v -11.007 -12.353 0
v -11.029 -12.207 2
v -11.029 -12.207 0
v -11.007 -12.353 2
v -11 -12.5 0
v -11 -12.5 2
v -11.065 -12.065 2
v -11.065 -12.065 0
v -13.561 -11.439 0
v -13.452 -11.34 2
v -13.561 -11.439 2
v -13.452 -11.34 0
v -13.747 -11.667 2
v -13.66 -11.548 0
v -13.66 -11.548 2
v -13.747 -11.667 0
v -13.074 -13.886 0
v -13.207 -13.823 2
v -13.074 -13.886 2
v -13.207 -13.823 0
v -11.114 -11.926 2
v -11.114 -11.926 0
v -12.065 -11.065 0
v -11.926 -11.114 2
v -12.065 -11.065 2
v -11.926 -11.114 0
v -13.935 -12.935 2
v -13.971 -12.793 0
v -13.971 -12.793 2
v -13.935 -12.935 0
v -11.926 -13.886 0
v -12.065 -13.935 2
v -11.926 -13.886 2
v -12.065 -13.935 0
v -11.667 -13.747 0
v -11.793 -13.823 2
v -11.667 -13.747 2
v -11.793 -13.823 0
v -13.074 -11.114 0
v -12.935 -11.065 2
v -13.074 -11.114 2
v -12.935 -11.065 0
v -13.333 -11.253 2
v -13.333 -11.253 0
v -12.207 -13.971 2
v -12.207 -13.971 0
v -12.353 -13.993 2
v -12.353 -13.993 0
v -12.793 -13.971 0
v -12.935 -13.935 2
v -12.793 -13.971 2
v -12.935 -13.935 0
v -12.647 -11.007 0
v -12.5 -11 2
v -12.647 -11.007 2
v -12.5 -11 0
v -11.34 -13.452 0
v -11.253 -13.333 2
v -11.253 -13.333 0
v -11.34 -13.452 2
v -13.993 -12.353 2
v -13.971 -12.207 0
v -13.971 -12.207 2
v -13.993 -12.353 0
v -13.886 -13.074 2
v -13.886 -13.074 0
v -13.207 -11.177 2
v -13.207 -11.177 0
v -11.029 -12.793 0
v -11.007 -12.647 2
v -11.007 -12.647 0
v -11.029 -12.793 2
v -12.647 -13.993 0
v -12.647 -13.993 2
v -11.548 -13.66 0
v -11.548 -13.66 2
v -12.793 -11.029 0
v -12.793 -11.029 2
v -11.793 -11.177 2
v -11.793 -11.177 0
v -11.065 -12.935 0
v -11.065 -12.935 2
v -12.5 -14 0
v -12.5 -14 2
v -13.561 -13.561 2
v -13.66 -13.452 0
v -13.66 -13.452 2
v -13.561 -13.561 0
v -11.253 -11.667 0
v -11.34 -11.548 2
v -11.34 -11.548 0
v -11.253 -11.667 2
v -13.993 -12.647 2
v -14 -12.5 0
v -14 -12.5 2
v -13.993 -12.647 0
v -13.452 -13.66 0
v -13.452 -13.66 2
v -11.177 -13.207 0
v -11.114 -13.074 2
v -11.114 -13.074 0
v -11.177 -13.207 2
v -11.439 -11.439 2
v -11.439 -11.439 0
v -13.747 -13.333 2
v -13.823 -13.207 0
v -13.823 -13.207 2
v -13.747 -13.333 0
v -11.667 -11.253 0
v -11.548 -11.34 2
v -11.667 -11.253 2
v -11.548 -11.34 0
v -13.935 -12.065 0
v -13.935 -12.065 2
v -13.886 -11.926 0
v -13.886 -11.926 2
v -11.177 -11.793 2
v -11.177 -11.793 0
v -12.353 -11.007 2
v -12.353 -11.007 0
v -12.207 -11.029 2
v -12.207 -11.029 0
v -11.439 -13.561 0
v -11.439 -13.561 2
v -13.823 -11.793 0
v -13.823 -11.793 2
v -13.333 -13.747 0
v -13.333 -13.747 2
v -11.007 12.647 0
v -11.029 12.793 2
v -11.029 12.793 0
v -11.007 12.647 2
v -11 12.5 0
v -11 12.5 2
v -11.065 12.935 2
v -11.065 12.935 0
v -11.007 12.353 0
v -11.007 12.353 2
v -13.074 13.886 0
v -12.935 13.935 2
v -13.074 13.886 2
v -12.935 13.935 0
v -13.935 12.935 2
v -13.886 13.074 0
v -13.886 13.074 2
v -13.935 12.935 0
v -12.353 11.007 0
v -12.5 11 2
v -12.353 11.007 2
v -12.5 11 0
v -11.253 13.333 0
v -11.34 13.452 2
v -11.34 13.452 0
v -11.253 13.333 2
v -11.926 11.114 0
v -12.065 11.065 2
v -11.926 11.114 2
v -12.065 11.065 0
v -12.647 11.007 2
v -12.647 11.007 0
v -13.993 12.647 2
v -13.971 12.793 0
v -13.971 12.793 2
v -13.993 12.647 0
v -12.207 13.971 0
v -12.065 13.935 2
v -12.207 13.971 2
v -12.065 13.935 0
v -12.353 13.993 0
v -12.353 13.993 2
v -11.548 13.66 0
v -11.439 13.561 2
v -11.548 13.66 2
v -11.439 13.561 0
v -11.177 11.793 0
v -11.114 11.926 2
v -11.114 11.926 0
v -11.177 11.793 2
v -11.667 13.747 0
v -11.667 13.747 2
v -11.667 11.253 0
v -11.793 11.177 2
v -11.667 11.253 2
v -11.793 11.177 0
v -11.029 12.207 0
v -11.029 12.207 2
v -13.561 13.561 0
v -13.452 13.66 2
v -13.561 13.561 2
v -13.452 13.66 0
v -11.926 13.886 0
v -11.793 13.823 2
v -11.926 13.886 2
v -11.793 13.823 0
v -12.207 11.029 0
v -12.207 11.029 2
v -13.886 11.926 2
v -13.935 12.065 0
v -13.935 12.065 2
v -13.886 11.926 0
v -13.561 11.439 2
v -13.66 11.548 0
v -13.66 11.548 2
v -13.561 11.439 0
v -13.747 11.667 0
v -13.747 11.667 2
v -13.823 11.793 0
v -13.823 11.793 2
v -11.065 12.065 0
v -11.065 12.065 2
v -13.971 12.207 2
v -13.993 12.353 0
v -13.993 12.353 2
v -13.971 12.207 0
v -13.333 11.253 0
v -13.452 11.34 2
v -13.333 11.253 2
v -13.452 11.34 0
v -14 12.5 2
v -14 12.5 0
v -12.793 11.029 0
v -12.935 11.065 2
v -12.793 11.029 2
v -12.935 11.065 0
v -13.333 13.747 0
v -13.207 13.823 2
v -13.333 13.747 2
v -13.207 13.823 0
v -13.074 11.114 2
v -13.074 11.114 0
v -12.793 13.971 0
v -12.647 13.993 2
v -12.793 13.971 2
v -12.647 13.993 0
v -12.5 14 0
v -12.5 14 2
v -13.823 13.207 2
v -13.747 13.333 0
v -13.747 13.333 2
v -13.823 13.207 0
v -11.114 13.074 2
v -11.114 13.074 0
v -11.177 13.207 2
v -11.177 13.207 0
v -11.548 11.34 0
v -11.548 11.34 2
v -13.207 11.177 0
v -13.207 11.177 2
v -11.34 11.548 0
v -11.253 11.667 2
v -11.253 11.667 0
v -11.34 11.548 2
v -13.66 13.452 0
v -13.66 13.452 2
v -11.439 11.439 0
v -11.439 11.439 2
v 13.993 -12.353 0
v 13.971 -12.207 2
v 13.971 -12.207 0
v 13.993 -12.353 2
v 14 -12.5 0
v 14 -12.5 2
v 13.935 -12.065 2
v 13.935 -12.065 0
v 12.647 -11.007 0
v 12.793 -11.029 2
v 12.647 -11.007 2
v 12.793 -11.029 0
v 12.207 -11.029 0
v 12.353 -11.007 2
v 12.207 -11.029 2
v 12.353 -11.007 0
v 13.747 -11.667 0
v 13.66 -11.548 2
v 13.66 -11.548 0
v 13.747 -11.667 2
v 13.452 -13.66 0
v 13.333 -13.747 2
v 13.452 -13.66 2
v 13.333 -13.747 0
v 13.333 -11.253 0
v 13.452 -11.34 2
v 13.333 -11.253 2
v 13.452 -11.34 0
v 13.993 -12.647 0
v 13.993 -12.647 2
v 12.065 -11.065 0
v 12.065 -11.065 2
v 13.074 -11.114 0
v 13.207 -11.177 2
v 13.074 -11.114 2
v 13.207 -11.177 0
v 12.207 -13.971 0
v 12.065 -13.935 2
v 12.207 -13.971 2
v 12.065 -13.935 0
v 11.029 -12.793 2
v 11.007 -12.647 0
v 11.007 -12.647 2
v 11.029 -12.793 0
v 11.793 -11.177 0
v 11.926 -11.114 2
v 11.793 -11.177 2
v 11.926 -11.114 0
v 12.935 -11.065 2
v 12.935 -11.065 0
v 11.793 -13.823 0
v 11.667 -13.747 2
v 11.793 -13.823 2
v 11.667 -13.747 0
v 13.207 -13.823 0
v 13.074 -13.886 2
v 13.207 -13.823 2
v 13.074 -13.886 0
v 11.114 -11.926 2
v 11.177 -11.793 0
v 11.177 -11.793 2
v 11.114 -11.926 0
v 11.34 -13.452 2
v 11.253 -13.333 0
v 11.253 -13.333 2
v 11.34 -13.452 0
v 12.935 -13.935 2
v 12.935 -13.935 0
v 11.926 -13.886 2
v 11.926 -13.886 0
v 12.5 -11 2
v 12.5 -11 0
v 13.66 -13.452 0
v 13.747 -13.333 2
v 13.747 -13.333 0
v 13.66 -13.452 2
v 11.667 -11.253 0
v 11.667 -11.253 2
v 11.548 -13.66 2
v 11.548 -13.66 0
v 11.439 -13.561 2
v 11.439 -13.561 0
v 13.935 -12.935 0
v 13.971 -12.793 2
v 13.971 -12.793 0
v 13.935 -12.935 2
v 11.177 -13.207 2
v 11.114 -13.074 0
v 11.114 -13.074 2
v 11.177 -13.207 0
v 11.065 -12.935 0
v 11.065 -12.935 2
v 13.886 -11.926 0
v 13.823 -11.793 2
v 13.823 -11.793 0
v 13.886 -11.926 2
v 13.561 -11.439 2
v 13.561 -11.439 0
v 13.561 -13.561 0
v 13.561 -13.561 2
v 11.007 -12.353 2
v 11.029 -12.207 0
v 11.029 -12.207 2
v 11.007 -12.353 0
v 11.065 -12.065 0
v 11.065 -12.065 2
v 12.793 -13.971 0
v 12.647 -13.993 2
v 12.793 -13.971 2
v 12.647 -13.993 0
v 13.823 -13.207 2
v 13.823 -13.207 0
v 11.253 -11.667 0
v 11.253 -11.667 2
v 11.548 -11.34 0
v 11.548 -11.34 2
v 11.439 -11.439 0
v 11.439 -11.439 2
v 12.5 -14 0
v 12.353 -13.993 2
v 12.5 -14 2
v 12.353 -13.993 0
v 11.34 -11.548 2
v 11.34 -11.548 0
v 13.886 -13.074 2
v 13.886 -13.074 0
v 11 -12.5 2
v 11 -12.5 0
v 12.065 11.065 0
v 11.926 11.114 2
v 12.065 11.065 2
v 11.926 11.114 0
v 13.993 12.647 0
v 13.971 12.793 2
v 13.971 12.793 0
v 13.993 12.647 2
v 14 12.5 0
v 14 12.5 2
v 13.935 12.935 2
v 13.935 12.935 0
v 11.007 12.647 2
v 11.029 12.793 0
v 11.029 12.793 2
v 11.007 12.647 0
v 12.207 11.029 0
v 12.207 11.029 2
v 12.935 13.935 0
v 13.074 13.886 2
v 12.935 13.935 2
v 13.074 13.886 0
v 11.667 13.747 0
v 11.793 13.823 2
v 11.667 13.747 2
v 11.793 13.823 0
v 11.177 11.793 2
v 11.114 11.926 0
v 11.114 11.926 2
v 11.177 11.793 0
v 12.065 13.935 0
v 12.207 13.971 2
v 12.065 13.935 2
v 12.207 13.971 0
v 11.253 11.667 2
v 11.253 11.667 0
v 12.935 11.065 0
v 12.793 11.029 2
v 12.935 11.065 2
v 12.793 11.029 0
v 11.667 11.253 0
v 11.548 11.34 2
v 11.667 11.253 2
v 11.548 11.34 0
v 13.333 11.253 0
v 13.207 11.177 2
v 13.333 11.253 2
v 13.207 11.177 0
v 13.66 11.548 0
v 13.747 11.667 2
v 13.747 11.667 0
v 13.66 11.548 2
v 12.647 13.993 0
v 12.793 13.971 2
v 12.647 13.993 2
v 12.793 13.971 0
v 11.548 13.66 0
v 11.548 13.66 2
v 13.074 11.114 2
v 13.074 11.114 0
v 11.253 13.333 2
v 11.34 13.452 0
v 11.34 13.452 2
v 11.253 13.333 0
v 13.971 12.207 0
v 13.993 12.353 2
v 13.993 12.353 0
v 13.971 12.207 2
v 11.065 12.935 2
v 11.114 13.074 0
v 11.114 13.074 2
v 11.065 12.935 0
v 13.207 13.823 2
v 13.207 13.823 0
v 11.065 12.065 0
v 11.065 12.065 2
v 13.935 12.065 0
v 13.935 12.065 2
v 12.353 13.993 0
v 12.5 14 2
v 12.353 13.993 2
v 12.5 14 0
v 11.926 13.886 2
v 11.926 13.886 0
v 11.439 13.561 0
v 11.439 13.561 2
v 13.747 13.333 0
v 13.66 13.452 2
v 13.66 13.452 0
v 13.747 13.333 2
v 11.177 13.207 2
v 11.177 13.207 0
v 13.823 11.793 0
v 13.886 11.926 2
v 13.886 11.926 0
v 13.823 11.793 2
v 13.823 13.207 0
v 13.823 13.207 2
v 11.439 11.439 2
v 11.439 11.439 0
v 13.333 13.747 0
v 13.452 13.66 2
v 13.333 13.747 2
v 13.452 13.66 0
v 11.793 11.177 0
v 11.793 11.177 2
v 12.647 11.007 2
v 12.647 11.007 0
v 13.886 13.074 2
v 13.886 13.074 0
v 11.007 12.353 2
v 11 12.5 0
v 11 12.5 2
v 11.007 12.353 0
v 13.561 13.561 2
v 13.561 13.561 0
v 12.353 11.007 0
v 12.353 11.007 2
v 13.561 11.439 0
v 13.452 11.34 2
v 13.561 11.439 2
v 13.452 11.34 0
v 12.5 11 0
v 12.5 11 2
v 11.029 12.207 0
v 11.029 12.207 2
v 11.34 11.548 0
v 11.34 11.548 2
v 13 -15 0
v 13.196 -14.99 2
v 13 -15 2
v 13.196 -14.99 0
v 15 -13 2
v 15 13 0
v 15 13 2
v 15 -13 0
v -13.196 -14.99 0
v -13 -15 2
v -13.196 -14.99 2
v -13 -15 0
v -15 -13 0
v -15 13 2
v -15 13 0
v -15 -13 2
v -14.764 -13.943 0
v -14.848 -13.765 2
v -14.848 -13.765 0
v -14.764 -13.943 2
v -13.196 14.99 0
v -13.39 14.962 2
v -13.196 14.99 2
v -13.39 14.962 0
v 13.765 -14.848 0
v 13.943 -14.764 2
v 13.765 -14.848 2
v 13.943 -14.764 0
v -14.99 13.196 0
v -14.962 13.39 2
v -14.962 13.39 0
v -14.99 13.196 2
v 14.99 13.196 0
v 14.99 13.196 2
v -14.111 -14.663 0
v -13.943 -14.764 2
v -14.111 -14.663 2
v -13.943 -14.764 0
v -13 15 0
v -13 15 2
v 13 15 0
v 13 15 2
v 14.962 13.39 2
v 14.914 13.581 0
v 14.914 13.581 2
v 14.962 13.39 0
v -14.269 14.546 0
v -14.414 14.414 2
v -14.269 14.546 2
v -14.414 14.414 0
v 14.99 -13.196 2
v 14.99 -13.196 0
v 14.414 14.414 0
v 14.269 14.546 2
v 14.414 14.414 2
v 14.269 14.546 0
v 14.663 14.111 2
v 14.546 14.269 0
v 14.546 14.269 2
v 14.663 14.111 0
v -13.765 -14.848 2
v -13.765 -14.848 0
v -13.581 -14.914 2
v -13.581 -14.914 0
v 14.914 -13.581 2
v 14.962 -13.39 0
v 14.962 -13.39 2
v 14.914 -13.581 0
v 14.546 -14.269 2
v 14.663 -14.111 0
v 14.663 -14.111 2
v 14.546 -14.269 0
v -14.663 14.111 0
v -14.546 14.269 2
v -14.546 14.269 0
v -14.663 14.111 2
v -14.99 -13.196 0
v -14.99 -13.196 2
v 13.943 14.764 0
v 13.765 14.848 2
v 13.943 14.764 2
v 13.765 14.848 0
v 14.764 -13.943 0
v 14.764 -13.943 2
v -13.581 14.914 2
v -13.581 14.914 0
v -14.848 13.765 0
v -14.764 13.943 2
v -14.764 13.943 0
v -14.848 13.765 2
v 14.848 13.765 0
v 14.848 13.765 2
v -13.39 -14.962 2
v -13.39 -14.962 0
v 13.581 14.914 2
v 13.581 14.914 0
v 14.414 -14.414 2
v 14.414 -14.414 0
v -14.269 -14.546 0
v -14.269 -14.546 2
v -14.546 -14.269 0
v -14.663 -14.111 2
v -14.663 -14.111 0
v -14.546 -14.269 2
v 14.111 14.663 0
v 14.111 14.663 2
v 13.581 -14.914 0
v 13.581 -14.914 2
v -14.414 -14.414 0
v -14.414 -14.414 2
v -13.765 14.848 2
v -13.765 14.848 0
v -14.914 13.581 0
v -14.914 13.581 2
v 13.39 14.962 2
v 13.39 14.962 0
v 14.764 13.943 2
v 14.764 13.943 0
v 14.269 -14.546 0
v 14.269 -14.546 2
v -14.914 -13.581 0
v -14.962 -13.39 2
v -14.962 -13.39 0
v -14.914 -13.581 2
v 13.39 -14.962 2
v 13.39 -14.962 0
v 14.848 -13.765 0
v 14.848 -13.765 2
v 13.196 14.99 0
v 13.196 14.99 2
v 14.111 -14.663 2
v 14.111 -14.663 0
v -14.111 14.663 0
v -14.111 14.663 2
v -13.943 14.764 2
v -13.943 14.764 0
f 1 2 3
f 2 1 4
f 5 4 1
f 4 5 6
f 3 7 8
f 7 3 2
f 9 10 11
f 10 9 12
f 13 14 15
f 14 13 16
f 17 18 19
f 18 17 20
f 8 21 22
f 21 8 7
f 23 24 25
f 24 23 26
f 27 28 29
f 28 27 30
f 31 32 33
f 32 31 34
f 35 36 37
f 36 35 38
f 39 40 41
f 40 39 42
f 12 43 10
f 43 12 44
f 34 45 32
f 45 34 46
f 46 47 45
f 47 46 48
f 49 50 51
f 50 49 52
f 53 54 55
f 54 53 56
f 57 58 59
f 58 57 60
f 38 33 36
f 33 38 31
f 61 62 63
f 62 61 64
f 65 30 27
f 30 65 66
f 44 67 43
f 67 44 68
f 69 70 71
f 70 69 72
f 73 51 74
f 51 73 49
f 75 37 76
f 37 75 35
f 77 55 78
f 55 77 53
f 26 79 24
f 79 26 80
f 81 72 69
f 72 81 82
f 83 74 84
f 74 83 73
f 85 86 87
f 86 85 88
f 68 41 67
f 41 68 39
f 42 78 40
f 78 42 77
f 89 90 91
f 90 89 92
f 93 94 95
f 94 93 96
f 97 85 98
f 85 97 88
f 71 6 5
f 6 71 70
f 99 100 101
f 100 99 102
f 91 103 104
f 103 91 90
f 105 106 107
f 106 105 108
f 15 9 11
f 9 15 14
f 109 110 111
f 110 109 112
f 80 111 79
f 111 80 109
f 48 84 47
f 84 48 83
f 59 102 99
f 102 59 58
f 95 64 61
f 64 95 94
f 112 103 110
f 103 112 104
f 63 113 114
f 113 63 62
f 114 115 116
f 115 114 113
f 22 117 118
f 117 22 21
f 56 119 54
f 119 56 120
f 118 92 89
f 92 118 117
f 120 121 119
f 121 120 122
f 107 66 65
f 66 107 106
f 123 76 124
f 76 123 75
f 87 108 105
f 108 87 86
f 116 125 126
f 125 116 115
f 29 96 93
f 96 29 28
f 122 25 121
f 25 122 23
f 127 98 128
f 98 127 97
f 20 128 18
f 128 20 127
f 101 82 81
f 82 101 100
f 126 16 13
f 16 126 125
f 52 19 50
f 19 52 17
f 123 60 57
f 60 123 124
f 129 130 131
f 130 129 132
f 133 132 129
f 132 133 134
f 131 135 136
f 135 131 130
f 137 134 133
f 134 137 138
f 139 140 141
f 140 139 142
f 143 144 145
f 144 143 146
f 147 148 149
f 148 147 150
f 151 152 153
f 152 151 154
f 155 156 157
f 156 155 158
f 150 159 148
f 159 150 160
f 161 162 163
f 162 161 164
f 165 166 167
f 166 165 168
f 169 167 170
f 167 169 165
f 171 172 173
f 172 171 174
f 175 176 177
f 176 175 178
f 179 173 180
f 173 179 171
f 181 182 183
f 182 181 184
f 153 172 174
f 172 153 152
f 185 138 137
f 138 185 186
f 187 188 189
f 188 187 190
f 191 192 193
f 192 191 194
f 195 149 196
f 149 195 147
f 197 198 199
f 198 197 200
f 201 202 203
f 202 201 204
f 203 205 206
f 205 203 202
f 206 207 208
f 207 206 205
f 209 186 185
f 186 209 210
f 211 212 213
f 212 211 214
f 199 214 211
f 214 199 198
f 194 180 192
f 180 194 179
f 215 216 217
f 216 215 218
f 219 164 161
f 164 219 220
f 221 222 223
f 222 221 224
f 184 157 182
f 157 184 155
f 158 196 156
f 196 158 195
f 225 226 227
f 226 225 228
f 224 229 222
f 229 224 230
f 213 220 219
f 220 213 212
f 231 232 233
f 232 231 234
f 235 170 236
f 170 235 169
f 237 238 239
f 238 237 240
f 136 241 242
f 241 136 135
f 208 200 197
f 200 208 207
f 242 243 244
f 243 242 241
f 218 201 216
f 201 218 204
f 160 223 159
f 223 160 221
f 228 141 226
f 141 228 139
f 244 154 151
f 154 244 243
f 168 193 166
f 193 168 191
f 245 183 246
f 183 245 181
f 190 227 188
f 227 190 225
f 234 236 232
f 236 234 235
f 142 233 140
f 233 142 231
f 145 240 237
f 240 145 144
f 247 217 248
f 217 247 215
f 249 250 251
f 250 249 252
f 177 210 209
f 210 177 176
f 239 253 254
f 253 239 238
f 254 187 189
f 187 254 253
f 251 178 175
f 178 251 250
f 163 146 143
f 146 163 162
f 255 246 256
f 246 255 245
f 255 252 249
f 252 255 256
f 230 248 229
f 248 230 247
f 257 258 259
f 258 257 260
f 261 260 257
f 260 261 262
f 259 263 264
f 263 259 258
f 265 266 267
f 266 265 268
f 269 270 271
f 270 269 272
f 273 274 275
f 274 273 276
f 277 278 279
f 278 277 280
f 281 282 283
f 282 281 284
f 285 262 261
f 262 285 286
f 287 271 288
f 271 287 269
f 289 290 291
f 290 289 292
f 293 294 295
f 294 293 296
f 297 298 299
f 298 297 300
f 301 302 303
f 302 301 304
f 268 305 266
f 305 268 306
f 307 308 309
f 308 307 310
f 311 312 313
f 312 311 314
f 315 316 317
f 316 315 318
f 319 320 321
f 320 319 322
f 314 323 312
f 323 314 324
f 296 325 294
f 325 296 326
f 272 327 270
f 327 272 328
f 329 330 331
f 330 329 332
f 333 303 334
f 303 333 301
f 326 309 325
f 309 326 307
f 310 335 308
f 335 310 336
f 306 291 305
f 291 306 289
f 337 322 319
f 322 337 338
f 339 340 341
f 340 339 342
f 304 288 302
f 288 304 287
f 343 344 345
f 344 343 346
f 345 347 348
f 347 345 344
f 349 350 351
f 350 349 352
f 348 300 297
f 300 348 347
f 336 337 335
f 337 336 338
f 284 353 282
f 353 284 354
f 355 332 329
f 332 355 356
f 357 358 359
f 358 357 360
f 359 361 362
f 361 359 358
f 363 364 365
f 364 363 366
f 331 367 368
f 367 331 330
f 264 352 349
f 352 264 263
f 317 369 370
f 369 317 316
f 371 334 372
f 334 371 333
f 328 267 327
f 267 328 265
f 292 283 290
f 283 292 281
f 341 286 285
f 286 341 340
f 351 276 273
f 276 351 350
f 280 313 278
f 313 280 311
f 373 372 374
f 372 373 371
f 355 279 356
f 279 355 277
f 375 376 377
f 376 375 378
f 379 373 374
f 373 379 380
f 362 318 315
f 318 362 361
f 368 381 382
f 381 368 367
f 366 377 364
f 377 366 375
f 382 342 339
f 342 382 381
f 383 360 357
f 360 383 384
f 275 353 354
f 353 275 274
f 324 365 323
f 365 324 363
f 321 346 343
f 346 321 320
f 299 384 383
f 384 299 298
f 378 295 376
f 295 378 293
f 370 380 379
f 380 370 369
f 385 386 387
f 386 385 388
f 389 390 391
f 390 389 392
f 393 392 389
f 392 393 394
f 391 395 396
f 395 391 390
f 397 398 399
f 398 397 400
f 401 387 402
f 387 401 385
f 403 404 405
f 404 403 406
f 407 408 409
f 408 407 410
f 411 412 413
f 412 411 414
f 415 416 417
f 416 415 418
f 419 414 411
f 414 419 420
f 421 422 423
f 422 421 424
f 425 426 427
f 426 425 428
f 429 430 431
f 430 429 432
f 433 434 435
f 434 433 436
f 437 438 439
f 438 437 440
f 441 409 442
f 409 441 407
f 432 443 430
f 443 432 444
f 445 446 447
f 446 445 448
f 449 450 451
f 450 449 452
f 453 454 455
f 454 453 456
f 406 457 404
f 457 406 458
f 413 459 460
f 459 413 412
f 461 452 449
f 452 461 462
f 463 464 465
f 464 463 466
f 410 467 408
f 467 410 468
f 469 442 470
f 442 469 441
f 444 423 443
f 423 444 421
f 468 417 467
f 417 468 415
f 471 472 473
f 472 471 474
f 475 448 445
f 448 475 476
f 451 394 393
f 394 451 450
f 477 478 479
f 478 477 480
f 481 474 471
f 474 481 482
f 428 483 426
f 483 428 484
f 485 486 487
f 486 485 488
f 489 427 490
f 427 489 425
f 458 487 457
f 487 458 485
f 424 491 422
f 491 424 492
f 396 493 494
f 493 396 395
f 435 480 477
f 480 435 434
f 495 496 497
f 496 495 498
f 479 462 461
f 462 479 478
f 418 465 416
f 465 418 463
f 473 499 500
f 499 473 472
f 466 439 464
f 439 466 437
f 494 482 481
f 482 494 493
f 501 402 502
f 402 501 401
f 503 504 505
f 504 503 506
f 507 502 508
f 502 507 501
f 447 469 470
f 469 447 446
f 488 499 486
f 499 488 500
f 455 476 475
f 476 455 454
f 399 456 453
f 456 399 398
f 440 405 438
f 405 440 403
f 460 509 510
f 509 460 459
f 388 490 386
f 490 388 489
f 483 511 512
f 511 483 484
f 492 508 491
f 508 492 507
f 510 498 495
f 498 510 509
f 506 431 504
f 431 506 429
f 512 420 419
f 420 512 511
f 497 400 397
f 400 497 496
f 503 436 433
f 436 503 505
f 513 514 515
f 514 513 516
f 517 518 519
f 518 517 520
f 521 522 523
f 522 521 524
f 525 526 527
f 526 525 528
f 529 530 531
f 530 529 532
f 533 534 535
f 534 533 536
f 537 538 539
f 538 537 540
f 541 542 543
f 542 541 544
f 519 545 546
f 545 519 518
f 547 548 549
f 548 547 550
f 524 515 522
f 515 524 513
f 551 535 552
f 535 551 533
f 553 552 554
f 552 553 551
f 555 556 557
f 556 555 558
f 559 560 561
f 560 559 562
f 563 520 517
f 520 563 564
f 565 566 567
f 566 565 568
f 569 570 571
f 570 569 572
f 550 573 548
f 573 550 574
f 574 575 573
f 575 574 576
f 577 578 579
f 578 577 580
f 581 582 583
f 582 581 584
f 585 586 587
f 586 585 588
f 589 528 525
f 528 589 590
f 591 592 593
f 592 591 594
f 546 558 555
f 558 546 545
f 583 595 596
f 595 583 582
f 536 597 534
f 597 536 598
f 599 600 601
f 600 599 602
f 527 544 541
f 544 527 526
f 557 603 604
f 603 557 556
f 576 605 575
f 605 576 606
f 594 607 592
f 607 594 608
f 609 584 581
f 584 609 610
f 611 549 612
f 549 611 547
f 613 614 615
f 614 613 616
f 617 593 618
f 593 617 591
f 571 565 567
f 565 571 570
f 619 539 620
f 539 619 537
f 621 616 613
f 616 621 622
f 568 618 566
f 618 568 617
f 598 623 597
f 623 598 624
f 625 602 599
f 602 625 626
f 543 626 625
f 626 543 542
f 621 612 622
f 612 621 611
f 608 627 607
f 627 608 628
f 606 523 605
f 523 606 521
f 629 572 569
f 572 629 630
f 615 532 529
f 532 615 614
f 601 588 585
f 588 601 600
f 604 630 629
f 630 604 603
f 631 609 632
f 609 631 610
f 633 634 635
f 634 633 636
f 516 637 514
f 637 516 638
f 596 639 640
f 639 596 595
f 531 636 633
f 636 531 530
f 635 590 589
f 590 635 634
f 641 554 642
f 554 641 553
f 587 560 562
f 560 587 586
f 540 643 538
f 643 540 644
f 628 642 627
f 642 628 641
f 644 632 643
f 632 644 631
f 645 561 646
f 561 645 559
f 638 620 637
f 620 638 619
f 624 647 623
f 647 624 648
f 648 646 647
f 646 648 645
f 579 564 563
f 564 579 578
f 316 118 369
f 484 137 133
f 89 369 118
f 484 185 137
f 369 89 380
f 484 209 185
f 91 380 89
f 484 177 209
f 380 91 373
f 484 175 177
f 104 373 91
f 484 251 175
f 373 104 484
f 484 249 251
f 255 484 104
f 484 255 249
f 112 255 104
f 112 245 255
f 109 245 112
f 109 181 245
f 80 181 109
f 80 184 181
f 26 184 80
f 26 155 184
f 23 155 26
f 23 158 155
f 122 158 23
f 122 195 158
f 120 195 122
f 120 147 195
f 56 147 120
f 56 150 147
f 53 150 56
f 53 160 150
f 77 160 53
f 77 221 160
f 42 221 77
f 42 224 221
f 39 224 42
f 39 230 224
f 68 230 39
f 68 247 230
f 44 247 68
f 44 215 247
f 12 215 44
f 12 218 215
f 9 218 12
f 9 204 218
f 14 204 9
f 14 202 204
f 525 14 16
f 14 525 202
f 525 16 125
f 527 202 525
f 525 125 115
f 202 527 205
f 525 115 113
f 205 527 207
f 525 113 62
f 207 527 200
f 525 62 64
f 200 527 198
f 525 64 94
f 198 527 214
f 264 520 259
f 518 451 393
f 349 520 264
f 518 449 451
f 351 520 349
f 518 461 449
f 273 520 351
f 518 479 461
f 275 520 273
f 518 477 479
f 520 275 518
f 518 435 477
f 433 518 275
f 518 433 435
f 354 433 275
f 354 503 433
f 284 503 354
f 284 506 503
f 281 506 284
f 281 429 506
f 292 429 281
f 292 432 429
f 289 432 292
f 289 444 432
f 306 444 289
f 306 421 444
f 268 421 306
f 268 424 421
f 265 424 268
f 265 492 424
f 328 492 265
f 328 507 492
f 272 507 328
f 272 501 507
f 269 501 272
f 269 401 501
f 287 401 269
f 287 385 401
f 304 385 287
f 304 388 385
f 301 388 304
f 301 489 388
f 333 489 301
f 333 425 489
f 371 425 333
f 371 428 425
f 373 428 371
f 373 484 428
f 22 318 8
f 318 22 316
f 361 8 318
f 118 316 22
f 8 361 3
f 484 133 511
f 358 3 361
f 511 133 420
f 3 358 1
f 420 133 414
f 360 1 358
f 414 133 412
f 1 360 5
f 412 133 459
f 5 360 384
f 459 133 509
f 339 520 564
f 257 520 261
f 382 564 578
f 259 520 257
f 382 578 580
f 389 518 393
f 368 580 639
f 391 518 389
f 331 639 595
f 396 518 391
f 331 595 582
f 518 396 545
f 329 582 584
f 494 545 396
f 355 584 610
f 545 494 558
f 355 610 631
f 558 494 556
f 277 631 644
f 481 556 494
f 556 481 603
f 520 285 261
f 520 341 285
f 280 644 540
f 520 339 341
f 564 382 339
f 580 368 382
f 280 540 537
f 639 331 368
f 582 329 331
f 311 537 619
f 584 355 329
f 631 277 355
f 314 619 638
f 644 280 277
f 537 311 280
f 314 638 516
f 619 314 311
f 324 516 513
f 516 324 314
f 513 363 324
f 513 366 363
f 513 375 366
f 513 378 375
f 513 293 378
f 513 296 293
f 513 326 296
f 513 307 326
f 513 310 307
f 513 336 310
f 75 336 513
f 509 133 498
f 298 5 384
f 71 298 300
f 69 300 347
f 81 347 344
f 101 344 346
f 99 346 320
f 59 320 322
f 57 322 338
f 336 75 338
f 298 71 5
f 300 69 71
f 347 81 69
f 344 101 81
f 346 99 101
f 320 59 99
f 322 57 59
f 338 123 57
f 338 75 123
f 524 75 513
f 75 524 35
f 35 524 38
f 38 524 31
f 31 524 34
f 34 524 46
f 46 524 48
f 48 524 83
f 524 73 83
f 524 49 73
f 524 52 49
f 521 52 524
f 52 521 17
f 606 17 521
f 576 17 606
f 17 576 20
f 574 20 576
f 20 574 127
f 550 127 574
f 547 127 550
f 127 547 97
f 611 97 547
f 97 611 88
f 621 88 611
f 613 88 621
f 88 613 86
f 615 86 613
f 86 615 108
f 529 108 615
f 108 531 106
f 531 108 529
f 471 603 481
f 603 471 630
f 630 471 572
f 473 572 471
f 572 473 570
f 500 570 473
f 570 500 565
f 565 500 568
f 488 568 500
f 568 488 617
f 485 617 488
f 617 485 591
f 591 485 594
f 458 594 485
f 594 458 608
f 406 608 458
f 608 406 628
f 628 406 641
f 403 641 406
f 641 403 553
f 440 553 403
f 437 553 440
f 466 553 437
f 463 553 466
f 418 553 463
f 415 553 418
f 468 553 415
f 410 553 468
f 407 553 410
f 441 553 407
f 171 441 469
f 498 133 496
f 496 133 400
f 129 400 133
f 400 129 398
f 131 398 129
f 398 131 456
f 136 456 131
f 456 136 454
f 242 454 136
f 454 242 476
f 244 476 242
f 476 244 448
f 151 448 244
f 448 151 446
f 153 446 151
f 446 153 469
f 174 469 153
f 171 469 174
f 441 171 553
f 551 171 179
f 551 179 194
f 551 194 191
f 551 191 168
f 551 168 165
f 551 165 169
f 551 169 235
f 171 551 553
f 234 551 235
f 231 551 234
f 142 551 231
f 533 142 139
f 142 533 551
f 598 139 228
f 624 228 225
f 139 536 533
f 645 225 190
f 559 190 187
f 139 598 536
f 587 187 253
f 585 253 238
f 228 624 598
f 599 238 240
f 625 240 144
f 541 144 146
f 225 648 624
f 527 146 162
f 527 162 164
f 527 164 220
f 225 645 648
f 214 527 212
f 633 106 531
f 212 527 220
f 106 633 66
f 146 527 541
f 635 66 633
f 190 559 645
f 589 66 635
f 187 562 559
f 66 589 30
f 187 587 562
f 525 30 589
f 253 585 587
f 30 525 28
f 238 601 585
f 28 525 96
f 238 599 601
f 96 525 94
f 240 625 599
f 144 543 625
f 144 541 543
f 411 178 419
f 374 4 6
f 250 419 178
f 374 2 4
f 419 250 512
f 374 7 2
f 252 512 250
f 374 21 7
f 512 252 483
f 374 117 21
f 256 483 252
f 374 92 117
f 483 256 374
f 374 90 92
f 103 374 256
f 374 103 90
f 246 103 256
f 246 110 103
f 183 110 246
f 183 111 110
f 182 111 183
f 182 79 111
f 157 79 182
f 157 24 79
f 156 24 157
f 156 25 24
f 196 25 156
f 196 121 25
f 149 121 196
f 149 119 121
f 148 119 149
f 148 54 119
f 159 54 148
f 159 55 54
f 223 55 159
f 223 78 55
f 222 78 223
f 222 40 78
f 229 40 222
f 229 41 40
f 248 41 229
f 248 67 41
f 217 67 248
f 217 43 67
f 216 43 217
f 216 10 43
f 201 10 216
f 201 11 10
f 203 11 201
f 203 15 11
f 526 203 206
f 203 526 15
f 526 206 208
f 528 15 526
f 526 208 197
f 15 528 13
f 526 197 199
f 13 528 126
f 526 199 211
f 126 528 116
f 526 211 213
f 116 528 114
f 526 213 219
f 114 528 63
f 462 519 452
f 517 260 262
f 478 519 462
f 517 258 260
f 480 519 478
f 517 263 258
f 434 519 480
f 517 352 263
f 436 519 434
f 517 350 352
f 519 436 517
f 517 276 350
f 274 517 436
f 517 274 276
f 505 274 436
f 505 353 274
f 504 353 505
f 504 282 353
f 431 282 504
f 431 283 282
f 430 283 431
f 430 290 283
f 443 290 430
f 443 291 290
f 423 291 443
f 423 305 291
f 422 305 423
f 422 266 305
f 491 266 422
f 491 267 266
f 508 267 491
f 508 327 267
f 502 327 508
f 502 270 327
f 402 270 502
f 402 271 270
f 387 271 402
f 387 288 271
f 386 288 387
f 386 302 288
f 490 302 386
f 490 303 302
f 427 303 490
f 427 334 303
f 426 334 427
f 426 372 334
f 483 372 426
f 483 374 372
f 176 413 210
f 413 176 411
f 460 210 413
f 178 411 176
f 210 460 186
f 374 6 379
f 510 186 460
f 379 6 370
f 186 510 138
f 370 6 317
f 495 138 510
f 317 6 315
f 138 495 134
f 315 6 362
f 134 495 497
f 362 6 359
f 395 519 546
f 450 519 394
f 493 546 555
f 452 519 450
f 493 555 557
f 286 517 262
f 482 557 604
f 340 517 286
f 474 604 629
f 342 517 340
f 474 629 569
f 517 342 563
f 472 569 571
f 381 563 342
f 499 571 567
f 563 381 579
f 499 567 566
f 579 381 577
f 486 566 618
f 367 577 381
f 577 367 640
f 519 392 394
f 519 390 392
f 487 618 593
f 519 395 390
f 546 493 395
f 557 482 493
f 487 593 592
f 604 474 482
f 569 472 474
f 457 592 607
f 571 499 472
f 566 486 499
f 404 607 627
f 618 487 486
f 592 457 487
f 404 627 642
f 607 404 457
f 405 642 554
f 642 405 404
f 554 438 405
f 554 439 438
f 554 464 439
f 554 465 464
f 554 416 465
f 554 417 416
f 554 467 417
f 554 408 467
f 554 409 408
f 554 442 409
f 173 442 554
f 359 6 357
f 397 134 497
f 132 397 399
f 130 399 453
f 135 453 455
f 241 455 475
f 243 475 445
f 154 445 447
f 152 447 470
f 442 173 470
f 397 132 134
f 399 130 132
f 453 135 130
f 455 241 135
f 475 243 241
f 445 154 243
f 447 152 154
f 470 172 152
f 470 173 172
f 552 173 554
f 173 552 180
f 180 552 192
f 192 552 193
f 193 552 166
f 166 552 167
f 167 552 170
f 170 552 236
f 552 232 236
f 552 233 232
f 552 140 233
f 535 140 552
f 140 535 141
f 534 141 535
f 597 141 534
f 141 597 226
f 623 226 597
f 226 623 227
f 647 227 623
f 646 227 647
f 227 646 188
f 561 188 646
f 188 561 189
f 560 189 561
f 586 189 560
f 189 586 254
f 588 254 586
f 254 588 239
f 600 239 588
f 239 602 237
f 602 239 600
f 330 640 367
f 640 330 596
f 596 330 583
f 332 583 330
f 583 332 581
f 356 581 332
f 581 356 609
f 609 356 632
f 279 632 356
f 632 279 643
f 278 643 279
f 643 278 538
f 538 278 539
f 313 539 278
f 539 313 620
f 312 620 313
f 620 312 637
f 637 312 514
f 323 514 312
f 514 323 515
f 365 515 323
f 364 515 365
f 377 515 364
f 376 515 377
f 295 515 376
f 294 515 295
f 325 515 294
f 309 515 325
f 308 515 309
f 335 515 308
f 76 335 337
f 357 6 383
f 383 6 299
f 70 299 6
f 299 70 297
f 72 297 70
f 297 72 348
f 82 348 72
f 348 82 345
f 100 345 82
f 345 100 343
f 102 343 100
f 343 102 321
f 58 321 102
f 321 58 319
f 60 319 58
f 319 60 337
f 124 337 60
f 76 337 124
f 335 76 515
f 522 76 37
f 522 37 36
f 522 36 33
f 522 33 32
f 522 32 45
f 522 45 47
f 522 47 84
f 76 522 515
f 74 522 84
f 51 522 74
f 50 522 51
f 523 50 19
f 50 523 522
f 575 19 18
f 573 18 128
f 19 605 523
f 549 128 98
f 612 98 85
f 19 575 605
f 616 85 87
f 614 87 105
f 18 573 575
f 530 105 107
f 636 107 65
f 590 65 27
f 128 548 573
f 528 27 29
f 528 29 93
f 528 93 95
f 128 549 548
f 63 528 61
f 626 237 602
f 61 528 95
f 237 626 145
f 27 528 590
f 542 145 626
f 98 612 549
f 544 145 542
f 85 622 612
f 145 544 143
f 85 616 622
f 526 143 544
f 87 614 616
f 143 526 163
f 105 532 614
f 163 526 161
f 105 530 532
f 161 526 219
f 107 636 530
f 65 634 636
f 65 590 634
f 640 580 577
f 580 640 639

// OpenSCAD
// file: ../lib/util.scad
// =============================================================================
// lib/util.scad — reusable 2D/3D helpers. All "cutter" modules are sized to
// over-shoot in Z so callers can subtract them cleanly; callers position them.
// Self-contained: `use <util.scad>` imports only modules, not variables, so we
// define our own over-cut constant here rather than relying on params.scad.
// =============================================================================

eps = 0.05;   // local over-cut for clean boolean subtractions

// ---- 2D primitives ----------------------------------------------------------

// Rounded rectangle centered at origin. r=0 -> sharp corners.
module rounded_rect(w, d, r = 0) {
    if (r > 0)
        offset(r = r) square([max(0.01, w - 2*r), max(0.01, d - 2*r)], center = true);
    else
        square([w, d], center = true);
}

// Isosceles trapezoid centered at origin: width w1 at the -X end, w2 at the +X
// end, length l along X. Used for the dovetail arm root + its mating pocket so
// the two always share one profile (call with +clearance for the pocket).
module trapezoid_2d(w1, w2, l) {
    polygon([[-l/2, -w1/2], [-l/2, w1/2], [l/2, w2/2], [l/2, -w2/2]]);
}

// Stadium slot: length l along X, width w along Y, fully rounded ends.
module slot_2d(l, w) {
    r = w / 2;
    hull() {
        translate([-(l/2 - r), 0]) circle(r = r);
        translate([ (l/2 - r), 0]) circle(r = r);
    }
}

// Inset-fillet a 2D shape: rounds BOTH convex and concave corners by radius r.
// Used for the arm root where the body blends into the clamp pad.
module fillet_2d(r) {
    offset(r = r) offset(delta = -r) children();
}

// ---- 3D solids --------------------------------------------------------------

// Flat plate: rounded rectangle, centered in XY, base on z=0.
module rounded_plate(w, d, h, r = 0) {
    linear_extrude(height = h) rounded_rect(w, d, r);
}

// ---- Cutters (subtract these) ----------------------------------------------

// Single through-hole, base on z=0, height h (caller lifts by -eps and pads h).
module hole(d, h) {
    translate([0, 0, -eps]) cylinder(d = d, h = h + 2*eps);
}

// 4-hole rectangular bolt pattern, spacing dx by dy, through a part of height h.
module bolt_grid(dx, dy, d, h) {
    for (x = [-dx/2, dx/2], y = [-dy/2, dy/2])
        translate([x, y, 0]) hole(d, h);
}

// 2-hole pair separated by `sep` along X (used for arm clamp / mast / cam).
module bolt_pair(sep, d, h) {
    for (x = [-sep/2, sep/2]) translate([x, 0, 0]) hole(d, h);
}

// Rounded-end through slot, length l along X.
module slot_cut(l, w, h) {
    translate([0, 0, -eps]) linear_extrude(height = h + 2*eps) slot_2d(l, w);
}

// Rectangular through cutout (window / strap slot), optional corner radius.
module rect_cut(l, w, h, r = 0) {
    translate([0, 0, -eps]) linear_extrude(height = h + 2*eps) rounded_rect(l, w, r);
}

// Shallow rectangular pocket cut DOWNWARD from the top face at z = top_z.
module pocket(l, w, depth, top_z, r = 0) {
    translate([0, 0, top_z - depth])
        linear_extrude(height = depth + eps) rounded_rect(l, w, r);
}

// Recess an arbitrary 2D child profile DOWN from the top face at z = top_z.
module recess_top(depth, top_z) {
    translate([0, 0, top_z - depth])
        linear_extrude(height = depth + eps) children();
}

// Recess an arbitrary 2D child profile UP from the bottom face (z = 0).
module recess_bottom(depth) {
    translate([0, 0, -eps])
        linear_extrude(height = depth + eps) children();
}

// Sensor-board seat: a rounded recess (captures the board by geometry, matching
// its rounded corners) plus two through mounting holes on the centerline.
// Subtract from a carrier of total thickness `h_total`, top face at `top_z`.
module board_cradle(l, w, r, depth, top_z, hole_d, hole_sep, h_total) {
    recess_top(depth, top_z) rounded_rect(l, w, r);
    for (x = [-hole_sep/2, hole_sep/2]) translate([x, 0, 0]) hole(hole_d, h_total);
}
// main file
// Part 6b — IMU Vibration Mount, Floating Plate
// 30 x 30 x 2. Carries the ICM-20948 (VHB tape) and hangs on the 4 silicone
// damper balls (25 x 25 pattern) above the lower plate. Decoupling the IMU this
// way targets the motor-EMI / vibration risks noted in DEVLOG.md.
include <../params.scad>
use <../lib/util.scad>

module imu_floating_plate() {
    difference() {
        rounded_plate(imu_floating, imu_floating, imu_mount_t, slot_corner_r);

        // Damper-ball holes (shared pattern with the lower plate)
        bolt_grid(damper_pattern, damper_pattern, damper_hole, imu_mount_t);
    }
}

imu_floating_plate();
